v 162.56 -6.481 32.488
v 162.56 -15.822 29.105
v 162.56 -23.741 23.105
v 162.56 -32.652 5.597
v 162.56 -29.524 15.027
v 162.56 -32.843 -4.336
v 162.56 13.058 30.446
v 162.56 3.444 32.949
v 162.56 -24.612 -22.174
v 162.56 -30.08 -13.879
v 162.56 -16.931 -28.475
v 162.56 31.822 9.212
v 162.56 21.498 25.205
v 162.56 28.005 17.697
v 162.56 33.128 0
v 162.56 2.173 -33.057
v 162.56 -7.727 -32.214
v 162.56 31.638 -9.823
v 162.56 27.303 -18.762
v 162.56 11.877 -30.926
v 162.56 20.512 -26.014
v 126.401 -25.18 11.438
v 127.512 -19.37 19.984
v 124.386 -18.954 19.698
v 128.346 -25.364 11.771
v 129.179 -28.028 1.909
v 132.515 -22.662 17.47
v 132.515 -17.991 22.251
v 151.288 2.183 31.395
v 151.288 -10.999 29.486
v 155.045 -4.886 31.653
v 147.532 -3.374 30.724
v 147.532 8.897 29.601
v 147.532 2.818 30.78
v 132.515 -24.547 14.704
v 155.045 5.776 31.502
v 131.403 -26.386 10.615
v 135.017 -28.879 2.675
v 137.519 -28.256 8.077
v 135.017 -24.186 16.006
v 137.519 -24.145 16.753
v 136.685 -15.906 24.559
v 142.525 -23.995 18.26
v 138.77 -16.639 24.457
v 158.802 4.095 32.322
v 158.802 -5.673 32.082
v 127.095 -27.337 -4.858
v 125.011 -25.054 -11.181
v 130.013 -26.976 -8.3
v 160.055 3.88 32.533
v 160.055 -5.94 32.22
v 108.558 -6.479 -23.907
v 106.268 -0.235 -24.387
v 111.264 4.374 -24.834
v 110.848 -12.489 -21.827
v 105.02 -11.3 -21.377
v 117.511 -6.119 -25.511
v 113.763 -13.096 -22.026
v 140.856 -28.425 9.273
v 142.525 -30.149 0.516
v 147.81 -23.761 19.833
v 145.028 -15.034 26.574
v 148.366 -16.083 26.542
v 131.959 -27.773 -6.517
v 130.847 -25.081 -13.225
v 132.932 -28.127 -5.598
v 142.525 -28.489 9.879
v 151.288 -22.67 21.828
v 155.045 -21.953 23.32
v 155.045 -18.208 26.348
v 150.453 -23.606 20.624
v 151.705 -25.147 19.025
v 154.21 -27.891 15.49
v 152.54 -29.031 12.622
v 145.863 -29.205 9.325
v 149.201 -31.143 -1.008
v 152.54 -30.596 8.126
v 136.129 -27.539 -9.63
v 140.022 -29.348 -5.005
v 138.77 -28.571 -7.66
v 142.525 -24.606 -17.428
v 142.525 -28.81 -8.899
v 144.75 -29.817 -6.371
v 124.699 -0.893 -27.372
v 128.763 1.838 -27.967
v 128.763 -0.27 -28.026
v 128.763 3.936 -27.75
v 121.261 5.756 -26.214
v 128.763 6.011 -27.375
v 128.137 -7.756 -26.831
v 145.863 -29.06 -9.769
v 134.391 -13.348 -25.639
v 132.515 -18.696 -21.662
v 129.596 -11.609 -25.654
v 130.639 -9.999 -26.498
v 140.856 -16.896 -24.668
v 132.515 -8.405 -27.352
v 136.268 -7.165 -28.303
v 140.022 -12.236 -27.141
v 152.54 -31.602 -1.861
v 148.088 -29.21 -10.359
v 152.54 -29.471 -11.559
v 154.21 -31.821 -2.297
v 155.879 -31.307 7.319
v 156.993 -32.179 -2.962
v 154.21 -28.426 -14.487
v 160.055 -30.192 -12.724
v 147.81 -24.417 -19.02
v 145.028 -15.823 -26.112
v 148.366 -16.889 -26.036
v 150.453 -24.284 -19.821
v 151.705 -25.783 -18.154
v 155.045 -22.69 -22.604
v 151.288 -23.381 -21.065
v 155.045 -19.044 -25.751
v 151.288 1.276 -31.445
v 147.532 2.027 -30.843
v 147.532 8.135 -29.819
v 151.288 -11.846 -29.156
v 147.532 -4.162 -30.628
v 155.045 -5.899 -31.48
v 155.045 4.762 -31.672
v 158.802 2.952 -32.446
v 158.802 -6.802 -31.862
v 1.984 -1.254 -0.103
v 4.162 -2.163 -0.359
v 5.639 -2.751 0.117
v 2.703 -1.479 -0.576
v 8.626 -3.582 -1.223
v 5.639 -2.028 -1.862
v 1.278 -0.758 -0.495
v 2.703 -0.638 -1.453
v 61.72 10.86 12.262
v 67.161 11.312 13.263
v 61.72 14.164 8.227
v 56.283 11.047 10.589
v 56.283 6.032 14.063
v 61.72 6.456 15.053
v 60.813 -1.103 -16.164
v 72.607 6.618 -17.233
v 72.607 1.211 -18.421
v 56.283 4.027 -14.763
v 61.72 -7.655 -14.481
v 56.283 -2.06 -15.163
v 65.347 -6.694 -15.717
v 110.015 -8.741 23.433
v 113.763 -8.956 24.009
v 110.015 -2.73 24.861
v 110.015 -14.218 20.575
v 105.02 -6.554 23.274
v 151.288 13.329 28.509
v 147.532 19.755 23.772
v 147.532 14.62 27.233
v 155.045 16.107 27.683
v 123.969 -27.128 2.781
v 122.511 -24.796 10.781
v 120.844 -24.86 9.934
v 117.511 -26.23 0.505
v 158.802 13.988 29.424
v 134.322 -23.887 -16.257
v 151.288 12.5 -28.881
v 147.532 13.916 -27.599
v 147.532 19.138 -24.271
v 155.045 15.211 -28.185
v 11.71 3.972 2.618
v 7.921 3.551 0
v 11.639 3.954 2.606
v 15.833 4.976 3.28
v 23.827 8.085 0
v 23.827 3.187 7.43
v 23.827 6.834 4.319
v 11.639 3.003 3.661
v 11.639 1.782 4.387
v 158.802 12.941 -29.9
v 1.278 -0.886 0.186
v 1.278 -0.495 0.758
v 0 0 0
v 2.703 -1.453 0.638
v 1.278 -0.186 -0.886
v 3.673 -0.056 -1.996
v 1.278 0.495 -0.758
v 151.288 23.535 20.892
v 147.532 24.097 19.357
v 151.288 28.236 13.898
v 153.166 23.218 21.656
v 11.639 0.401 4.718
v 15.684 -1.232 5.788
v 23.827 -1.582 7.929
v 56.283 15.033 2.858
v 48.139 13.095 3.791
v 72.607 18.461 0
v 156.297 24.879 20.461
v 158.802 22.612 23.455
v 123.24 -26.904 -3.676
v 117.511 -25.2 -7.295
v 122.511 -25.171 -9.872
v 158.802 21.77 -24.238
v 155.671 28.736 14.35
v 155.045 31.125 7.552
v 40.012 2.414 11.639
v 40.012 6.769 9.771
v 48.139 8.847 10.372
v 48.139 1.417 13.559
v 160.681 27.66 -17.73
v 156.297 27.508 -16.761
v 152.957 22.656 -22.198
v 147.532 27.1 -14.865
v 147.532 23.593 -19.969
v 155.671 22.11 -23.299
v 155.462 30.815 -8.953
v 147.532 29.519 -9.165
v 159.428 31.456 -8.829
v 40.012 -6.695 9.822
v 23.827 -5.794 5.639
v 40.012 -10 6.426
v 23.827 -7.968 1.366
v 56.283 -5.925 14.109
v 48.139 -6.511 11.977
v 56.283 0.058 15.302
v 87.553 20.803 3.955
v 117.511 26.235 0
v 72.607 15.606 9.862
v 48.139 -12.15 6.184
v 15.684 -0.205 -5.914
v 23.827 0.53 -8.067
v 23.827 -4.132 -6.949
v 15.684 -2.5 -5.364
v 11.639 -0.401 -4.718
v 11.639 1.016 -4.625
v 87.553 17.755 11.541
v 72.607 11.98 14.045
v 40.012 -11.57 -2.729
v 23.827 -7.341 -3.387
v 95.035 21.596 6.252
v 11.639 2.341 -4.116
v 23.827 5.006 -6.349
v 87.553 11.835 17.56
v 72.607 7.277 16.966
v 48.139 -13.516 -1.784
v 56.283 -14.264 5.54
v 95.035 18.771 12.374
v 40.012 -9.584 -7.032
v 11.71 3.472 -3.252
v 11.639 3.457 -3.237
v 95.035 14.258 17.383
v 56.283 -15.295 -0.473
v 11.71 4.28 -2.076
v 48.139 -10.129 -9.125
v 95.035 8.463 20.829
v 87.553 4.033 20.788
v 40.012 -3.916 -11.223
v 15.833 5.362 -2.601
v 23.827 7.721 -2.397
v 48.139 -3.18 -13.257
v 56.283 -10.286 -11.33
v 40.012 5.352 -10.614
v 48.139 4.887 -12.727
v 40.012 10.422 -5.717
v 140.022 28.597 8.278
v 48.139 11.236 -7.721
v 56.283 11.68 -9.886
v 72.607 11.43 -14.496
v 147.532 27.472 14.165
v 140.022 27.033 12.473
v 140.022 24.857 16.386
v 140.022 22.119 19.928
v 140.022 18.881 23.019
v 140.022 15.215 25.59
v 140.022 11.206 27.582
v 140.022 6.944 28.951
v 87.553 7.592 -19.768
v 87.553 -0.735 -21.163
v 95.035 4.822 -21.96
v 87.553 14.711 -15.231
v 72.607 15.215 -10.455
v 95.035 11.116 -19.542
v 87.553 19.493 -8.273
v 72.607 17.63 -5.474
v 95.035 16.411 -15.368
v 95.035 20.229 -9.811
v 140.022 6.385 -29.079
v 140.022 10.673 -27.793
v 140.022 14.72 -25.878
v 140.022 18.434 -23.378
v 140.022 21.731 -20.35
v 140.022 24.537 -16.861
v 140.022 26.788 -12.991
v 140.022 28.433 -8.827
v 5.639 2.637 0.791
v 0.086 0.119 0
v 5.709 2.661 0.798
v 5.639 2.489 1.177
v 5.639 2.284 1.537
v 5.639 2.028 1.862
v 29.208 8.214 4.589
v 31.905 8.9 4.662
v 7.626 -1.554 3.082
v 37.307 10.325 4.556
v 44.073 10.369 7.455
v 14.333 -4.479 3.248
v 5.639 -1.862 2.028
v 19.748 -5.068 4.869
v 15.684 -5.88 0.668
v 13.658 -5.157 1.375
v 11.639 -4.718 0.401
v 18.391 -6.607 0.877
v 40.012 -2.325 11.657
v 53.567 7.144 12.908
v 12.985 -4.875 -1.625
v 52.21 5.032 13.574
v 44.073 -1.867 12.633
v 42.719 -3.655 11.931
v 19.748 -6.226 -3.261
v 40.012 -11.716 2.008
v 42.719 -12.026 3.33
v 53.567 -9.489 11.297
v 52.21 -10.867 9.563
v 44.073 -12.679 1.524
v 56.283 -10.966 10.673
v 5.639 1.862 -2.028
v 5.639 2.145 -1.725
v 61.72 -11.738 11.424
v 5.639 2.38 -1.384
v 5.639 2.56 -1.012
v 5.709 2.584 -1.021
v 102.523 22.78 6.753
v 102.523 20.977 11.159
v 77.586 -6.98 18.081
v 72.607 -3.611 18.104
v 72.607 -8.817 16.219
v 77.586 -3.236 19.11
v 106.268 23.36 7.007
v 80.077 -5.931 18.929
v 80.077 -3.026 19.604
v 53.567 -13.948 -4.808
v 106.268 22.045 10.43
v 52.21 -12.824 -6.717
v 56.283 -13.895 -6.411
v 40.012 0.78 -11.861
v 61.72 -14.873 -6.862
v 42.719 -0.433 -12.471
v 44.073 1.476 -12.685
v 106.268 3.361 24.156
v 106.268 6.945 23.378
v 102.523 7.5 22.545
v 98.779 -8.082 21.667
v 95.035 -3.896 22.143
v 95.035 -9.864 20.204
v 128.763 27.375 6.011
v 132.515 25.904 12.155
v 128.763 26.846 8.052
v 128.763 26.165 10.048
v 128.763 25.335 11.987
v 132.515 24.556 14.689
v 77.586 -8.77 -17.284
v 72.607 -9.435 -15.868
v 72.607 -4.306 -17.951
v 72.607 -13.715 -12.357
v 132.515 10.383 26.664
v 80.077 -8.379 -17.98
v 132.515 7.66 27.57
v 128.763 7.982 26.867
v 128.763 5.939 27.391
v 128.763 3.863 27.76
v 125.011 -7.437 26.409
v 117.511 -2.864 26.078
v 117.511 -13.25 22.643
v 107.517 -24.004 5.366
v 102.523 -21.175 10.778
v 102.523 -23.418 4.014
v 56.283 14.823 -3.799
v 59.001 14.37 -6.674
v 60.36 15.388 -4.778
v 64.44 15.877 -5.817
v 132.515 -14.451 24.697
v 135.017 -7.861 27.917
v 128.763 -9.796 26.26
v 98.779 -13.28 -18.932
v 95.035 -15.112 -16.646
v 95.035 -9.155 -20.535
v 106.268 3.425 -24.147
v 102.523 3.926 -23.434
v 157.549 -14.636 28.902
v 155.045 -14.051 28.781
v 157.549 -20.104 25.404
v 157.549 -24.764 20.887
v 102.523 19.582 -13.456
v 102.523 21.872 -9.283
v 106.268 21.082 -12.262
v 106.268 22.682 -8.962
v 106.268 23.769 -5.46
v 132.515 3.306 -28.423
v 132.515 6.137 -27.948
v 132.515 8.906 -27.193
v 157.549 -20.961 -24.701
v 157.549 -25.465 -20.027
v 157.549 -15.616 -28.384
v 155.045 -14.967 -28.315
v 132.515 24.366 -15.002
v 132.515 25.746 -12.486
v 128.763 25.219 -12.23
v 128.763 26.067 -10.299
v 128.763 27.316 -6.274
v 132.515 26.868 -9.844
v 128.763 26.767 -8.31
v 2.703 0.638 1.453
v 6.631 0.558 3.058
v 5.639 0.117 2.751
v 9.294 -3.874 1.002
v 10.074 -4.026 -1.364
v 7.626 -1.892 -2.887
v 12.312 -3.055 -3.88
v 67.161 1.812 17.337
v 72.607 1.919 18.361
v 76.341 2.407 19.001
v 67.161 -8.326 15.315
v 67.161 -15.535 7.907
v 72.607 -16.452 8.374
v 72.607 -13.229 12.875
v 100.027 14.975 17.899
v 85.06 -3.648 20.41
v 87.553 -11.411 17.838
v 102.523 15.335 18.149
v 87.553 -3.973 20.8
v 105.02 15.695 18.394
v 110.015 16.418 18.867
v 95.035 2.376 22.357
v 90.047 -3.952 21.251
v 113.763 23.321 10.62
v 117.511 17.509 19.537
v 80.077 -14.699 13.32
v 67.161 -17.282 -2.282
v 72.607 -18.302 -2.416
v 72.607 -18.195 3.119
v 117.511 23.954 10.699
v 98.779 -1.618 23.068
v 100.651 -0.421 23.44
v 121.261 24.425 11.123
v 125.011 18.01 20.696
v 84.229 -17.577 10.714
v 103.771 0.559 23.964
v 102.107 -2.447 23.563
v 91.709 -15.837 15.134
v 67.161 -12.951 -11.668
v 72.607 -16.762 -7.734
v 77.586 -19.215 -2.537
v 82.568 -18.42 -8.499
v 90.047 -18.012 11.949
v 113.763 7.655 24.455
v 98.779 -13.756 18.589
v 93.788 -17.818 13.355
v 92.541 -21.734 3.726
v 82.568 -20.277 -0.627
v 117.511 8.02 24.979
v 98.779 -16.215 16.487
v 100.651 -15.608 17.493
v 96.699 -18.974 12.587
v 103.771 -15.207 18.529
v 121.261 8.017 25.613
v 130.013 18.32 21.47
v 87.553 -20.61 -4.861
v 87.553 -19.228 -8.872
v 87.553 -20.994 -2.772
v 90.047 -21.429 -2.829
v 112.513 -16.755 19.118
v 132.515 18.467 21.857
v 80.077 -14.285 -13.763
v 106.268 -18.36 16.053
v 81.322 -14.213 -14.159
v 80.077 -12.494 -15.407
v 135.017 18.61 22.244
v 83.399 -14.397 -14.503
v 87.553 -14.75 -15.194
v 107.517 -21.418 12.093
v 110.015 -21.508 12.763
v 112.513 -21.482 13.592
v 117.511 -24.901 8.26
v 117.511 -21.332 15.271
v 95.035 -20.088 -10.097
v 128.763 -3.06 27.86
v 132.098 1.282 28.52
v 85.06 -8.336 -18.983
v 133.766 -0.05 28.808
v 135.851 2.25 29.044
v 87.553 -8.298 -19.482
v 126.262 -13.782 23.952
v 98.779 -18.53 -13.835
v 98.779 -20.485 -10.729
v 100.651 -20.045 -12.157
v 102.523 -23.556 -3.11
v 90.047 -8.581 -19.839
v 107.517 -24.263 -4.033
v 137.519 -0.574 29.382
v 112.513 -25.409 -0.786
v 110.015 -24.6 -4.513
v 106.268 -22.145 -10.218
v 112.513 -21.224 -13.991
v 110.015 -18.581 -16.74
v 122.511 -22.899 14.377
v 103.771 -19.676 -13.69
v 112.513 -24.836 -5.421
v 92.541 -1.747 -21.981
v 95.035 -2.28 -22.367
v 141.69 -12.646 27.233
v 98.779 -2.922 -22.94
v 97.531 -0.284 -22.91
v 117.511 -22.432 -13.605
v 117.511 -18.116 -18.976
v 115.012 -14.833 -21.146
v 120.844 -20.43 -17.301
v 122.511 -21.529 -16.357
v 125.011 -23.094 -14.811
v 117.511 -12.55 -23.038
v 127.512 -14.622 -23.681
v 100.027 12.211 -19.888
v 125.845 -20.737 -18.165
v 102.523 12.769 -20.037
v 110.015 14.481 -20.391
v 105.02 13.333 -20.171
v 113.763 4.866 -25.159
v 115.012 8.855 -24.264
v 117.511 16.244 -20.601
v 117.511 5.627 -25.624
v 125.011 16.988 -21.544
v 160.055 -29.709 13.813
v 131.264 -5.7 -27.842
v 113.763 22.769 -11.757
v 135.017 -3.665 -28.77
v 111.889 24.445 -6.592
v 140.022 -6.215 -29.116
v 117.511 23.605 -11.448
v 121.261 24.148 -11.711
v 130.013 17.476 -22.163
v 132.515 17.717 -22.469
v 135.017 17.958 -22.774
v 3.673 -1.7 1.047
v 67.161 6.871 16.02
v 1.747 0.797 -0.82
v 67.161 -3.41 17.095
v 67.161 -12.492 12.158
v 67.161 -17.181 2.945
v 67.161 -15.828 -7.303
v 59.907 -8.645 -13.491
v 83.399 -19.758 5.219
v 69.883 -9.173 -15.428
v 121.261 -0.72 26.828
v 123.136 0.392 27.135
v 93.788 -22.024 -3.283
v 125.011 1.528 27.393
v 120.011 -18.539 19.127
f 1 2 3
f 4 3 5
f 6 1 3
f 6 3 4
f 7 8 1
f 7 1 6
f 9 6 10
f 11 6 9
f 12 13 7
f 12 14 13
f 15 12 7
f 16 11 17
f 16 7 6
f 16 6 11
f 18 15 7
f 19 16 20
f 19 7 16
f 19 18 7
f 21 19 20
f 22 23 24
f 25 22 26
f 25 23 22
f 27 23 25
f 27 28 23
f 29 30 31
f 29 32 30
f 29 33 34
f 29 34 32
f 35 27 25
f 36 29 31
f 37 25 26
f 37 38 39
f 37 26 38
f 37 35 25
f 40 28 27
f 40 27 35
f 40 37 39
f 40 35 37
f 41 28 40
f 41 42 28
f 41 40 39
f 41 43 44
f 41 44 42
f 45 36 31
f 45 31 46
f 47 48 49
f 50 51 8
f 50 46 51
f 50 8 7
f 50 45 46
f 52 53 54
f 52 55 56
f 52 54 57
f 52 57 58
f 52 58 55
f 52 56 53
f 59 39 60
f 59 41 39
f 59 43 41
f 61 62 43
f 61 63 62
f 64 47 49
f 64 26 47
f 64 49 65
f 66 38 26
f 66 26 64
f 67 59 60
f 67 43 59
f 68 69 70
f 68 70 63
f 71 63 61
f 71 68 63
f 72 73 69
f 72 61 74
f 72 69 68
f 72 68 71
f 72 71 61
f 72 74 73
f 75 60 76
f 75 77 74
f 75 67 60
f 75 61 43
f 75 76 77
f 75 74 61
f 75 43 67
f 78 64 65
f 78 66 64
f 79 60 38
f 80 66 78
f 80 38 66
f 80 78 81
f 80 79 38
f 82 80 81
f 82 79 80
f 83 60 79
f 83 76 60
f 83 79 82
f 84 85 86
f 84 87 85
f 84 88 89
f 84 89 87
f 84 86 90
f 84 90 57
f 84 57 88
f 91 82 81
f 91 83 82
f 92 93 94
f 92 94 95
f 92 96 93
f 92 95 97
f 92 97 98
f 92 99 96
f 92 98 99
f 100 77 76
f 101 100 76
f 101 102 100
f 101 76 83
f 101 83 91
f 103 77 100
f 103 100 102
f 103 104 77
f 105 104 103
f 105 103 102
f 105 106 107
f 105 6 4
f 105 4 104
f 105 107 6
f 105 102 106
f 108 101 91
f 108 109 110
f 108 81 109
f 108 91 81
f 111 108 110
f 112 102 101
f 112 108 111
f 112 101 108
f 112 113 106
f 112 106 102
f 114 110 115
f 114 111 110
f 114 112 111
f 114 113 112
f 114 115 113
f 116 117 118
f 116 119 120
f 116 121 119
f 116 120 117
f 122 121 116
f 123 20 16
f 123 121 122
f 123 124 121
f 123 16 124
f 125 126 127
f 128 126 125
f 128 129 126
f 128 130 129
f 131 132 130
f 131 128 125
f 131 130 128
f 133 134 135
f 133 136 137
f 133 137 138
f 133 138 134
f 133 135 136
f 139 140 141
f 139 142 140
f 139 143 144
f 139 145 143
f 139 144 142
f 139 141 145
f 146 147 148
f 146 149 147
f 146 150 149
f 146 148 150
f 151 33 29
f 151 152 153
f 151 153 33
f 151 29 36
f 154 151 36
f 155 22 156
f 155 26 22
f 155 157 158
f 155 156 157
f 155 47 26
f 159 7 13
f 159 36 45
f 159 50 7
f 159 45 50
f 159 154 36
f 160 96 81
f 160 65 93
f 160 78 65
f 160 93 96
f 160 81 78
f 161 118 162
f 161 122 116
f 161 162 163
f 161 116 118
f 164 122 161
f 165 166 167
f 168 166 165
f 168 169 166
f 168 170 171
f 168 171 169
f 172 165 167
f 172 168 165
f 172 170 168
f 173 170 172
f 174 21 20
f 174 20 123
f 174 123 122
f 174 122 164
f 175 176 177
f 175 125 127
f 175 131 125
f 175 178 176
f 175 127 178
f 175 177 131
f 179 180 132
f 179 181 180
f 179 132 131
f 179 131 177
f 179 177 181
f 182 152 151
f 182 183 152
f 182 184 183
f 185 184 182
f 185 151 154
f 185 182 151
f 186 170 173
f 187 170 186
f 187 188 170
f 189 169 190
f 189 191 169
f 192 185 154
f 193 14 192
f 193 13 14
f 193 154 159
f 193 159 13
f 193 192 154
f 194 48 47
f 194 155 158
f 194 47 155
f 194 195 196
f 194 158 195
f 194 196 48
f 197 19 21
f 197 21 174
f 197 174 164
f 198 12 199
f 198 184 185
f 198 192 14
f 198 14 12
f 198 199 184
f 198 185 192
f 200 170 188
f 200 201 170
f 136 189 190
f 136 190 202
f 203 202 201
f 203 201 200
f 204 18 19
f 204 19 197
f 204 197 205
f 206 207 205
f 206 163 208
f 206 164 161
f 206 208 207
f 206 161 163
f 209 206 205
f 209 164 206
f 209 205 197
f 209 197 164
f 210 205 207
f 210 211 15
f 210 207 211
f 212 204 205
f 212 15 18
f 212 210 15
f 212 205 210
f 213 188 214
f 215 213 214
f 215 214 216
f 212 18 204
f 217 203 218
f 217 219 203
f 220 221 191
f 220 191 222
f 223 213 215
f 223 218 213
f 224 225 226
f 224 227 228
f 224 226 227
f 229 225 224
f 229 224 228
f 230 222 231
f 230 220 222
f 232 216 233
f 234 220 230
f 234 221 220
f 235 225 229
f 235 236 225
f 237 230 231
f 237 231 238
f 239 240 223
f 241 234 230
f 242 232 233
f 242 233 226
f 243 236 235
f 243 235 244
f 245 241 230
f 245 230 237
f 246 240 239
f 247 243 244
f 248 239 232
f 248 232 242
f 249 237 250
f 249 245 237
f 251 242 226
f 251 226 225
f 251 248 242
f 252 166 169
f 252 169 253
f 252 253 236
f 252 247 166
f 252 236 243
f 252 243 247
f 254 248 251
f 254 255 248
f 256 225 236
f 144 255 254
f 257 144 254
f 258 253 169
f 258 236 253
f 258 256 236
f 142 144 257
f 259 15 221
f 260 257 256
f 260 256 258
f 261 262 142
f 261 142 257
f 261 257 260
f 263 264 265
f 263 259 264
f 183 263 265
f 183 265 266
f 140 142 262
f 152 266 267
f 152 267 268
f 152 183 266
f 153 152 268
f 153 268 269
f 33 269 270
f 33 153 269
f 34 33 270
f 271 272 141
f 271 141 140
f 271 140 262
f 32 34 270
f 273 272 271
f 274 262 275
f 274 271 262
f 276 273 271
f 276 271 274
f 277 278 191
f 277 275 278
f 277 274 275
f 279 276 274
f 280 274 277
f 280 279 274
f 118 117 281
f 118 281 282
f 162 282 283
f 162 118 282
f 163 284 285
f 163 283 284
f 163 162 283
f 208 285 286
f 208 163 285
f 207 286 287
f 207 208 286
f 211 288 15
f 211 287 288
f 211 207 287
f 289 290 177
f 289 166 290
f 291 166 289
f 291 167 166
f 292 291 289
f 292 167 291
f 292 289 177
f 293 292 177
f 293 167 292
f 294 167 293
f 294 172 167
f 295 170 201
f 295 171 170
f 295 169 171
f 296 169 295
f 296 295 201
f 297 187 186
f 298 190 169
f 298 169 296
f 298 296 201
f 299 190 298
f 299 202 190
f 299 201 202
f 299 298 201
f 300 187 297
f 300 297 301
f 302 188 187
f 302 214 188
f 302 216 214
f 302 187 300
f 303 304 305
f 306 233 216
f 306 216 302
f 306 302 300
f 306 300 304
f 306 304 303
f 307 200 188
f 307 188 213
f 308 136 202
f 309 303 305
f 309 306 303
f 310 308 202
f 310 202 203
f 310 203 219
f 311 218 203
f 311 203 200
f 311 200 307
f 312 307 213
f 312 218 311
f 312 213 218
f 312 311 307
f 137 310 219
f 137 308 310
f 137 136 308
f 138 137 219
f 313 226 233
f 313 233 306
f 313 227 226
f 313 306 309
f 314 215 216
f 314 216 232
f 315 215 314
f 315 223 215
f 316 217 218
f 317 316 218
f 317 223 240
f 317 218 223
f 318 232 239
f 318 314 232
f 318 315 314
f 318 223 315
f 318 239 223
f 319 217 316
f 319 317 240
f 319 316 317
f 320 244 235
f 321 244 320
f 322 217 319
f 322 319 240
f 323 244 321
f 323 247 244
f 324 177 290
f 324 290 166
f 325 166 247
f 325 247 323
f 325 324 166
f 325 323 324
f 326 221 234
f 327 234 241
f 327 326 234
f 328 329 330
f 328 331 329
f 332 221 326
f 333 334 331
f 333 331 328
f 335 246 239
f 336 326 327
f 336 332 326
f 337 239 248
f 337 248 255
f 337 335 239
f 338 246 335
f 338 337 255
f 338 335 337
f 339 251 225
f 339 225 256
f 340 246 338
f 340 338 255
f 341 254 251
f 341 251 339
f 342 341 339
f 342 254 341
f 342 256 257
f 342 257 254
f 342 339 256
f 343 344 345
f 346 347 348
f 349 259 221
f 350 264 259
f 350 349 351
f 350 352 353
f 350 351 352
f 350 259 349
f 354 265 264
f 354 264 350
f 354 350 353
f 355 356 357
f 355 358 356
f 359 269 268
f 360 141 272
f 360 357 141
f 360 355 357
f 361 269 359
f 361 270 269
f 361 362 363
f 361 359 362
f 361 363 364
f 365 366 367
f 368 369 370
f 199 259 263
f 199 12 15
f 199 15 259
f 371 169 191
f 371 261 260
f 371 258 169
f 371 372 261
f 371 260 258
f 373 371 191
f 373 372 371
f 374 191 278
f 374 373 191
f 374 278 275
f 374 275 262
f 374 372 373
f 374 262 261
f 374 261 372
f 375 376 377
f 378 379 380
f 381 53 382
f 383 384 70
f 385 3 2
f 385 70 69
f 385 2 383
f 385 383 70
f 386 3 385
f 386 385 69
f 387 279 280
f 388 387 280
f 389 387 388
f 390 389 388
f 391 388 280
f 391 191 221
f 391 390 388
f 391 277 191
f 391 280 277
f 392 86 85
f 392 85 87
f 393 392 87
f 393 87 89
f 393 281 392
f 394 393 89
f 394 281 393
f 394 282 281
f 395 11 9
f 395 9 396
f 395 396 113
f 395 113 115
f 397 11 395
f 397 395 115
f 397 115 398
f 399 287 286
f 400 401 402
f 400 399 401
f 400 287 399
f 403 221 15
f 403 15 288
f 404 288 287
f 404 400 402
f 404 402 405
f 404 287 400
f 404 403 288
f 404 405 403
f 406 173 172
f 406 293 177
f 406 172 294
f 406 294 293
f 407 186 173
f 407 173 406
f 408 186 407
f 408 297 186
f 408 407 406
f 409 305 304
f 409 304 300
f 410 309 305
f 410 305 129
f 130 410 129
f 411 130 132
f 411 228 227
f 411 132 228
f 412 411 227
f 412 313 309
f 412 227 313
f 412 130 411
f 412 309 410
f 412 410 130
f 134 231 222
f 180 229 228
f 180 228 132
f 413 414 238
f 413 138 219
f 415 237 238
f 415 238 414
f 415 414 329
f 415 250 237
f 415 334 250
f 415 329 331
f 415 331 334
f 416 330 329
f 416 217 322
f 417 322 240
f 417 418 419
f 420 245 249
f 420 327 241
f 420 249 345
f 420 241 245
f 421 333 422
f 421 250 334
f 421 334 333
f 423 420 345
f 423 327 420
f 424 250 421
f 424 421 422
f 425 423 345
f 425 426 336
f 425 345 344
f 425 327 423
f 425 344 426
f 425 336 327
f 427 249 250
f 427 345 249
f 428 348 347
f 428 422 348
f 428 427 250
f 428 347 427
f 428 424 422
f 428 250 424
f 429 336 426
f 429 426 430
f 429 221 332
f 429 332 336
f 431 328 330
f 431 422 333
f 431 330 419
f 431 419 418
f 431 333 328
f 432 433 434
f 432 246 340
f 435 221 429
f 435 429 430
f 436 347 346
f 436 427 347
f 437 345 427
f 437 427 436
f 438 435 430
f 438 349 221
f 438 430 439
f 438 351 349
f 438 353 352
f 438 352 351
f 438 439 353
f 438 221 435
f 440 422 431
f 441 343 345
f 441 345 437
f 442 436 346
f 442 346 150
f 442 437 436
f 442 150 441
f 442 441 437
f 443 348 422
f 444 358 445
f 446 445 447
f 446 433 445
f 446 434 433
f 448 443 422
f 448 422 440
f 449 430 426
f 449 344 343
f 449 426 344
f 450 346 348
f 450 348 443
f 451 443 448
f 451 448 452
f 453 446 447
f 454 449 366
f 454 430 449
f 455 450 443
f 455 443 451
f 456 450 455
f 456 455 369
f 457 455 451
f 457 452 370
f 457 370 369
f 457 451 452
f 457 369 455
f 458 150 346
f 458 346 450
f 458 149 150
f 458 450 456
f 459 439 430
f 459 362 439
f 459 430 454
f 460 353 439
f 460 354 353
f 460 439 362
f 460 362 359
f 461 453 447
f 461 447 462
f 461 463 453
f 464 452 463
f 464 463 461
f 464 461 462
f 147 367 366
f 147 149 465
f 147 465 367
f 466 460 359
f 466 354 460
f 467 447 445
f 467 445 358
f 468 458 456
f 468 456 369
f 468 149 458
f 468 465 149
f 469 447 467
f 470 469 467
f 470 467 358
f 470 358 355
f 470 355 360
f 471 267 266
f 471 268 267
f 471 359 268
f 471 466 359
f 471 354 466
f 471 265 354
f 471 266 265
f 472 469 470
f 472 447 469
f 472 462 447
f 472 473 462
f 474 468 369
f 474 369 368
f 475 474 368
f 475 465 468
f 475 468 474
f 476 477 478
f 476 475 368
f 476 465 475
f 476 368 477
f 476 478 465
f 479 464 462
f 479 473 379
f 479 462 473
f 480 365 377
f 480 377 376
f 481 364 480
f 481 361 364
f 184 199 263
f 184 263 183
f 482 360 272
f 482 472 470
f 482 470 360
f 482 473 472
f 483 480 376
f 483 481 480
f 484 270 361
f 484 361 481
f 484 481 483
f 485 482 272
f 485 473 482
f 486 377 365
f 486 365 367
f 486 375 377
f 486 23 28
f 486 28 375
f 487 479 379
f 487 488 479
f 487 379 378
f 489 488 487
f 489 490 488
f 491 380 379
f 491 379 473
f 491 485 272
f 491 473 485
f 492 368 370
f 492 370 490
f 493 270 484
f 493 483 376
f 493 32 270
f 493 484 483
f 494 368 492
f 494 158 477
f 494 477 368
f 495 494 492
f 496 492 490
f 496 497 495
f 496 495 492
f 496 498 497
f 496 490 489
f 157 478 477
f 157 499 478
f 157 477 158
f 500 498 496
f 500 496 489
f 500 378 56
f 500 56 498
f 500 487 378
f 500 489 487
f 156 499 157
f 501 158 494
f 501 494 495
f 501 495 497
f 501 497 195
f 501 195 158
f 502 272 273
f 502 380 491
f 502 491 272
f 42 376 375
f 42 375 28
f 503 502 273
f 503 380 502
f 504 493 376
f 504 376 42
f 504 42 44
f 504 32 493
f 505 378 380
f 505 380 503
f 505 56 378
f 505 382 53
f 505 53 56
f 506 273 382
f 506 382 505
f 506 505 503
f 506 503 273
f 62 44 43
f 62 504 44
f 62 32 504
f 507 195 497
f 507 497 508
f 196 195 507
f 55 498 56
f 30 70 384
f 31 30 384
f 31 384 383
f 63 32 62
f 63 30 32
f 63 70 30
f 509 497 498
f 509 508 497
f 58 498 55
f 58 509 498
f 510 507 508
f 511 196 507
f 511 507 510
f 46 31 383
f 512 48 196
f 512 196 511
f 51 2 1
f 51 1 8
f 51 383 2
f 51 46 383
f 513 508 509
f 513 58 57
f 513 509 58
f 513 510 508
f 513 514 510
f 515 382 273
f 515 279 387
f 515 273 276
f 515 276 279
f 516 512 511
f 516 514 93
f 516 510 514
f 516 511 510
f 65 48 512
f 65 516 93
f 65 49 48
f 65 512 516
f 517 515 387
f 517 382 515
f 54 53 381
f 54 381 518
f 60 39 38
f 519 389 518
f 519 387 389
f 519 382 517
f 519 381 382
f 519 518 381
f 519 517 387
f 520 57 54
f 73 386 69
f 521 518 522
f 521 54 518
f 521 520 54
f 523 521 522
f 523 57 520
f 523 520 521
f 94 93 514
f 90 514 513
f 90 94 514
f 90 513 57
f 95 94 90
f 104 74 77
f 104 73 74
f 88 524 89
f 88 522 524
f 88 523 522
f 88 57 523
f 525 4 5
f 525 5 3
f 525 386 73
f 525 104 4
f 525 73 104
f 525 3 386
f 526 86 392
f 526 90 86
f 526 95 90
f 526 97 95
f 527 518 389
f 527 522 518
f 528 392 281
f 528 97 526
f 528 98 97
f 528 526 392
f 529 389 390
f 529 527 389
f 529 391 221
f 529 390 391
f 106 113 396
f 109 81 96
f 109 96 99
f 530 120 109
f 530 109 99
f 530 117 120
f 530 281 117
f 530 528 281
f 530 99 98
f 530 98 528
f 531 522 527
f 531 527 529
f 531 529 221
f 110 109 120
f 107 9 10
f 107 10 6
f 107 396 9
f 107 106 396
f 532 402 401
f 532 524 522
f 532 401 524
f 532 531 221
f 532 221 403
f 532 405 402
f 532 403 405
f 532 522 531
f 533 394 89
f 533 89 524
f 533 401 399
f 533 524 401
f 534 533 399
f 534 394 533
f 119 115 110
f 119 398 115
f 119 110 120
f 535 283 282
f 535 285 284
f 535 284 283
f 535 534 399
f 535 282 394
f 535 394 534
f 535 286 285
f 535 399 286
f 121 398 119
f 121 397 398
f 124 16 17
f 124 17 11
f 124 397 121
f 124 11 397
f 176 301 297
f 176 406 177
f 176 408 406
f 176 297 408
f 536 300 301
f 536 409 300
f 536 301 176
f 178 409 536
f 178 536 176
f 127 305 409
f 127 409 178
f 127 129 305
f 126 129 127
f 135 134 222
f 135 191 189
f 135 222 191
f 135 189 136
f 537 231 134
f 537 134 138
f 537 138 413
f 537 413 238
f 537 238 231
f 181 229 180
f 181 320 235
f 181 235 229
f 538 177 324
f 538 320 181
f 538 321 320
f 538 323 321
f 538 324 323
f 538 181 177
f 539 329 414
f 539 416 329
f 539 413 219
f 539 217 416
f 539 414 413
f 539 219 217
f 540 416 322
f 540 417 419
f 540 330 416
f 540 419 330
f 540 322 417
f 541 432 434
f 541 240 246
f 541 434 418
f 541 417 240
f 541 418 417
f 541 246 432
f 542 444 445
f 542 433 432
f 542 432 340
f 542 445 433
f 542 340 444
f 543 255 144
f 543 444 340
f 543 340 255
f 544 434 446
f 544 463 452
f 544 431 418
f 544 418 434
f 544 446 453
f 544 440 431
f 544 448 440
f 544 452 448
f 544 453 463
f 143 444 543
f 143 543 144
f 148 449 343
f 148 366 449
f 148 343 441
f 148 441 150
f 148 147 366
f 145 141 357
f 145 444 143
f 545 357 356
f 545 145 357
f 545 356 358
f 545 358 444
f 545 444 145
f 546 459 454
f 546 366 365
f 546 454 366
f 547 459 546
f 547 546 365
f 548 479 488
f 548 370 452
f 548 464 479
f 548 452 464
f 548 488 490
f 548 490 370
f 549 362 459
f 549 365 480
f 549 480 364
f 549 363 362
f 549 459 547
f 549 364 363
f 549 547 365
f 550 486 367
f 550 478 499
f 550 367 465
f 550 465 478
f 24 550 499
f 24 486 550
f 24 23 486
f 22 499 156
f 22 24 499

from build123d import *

# Parameters (mm, degrees)
SKETCH8_R           = 83.841254666
BOSS_EXTRUDE1_DEPTH = 10.16
SKETCH9_R           = 117.461252673
CUT_EXTRUDE1_DEPTH  = 681.99


with BuildPart() as part:
    # Sketch7 → Revolve3 (revolve)
    with BuildSketch(Plane.XY):
        with BuildLine():
            Line((762, 83.841254666), (762, 0))
            Line((762, 0), (0, 0))
            add(Edge.make_bspline(
                [(0, 0), (0.002469036, 0.007698152), (0.00852038, 0.022545642), (0.025428785, 0.049911406), (0.065694849, 0.100096678), (0.127523873, 0.163176144), (0.212062429, 0.237272493), (0.332279694, 0.331578396), (0.47681638, 0.434147846), (0.646496772, 0.544815952), (0.841412681, 0.663024364), (1.126864222, 0.82633392), (1.572744504, 1.062892156), (2.33539055, 1.432268664), (3.710931738, 2.02979685), (6.154578127, 2.969838304), (10.668005752, 4.490267325), (18.999517068, 6.917303838), (33.385795617, 10.520869917), (58.214680344, 15.881727226), (92.501407111, 22.236378549), (134.347160824, 29.066892837), (181.232321928, 35.913847395), (228.199436648, 42.167572329), (275.229416109, 47.928683924), (322.309575865, 53.261898342), (369.432294544, 58.204857708), (416.591925172, 62.781349507), (463.784734462, 67.002125548), (511.007900045, 70.868414522), (558.259527802, 74.370378395), (605.538293137, 77.485800464), (646.930327879, 79.837294836), (682.425589554, 81.539197971), (710.863439026, 82.65535626), (729.852911101, 83.259007577), (745.309411706, 83.632760833), (754.846503834, 83.785926018), (759.61543609, 83.834878653), (762, 83.841254666)],
                knots=[0, 0, 0, 0, 0, 4.177e-05, 8.3539e-05, 0.000167079, 0.000334158, 0.000501236, 0.000668315, 0.000962463, 0.001256611, 0.001555846, 0.001855081, 0.002674694, 0.003884179, 0.005967022, 0.009661666, 0.016303633, 0.028675652, 0.051140007, 0.0868676, 0.148543873, 0.210220157, 0.271896443, 0.333572727, 0.395249011, 0.456925295, 0.518601581, 0.580277867, 0.641954151, 0.703630435, 0.765306721, 0.826983006, 0.888659291, 0.919497433, 0.950335576, 0.975167788, 0.987583894, 1, 1, 1, 1, 1], degree=4))
        make_face()
    revolve(axis=Axis((0, 0, 0), (1, 0, 0)))

    # Sketch8 → Boss-Extrude1 (add)
    with BuildSketch(Plane(origin=(762, 0, 0), x_dir=(0, 0, -1), z_dir=(1, 0, 0))):
        with Locations(Location((0, 0, 0), (0, 0, 90))):
            Circle(SKETCH8_R)
    extrude(amount=BOSS_EXTRUDE1_DEPTH)

    # Sketch9 → Cut-Extrude1 (cut)
    with BuildSketch(Plane(origin=(162.56, 0, 0), x_dir=(0, 0, -1), z_dir=(1, 0, 0))):
        Circle(SKETCH9_R)
    extrude(amount=CUT_EXTRUDE1_DEPTH, mode=Mode.SUBTRACT)


solid = part.part
